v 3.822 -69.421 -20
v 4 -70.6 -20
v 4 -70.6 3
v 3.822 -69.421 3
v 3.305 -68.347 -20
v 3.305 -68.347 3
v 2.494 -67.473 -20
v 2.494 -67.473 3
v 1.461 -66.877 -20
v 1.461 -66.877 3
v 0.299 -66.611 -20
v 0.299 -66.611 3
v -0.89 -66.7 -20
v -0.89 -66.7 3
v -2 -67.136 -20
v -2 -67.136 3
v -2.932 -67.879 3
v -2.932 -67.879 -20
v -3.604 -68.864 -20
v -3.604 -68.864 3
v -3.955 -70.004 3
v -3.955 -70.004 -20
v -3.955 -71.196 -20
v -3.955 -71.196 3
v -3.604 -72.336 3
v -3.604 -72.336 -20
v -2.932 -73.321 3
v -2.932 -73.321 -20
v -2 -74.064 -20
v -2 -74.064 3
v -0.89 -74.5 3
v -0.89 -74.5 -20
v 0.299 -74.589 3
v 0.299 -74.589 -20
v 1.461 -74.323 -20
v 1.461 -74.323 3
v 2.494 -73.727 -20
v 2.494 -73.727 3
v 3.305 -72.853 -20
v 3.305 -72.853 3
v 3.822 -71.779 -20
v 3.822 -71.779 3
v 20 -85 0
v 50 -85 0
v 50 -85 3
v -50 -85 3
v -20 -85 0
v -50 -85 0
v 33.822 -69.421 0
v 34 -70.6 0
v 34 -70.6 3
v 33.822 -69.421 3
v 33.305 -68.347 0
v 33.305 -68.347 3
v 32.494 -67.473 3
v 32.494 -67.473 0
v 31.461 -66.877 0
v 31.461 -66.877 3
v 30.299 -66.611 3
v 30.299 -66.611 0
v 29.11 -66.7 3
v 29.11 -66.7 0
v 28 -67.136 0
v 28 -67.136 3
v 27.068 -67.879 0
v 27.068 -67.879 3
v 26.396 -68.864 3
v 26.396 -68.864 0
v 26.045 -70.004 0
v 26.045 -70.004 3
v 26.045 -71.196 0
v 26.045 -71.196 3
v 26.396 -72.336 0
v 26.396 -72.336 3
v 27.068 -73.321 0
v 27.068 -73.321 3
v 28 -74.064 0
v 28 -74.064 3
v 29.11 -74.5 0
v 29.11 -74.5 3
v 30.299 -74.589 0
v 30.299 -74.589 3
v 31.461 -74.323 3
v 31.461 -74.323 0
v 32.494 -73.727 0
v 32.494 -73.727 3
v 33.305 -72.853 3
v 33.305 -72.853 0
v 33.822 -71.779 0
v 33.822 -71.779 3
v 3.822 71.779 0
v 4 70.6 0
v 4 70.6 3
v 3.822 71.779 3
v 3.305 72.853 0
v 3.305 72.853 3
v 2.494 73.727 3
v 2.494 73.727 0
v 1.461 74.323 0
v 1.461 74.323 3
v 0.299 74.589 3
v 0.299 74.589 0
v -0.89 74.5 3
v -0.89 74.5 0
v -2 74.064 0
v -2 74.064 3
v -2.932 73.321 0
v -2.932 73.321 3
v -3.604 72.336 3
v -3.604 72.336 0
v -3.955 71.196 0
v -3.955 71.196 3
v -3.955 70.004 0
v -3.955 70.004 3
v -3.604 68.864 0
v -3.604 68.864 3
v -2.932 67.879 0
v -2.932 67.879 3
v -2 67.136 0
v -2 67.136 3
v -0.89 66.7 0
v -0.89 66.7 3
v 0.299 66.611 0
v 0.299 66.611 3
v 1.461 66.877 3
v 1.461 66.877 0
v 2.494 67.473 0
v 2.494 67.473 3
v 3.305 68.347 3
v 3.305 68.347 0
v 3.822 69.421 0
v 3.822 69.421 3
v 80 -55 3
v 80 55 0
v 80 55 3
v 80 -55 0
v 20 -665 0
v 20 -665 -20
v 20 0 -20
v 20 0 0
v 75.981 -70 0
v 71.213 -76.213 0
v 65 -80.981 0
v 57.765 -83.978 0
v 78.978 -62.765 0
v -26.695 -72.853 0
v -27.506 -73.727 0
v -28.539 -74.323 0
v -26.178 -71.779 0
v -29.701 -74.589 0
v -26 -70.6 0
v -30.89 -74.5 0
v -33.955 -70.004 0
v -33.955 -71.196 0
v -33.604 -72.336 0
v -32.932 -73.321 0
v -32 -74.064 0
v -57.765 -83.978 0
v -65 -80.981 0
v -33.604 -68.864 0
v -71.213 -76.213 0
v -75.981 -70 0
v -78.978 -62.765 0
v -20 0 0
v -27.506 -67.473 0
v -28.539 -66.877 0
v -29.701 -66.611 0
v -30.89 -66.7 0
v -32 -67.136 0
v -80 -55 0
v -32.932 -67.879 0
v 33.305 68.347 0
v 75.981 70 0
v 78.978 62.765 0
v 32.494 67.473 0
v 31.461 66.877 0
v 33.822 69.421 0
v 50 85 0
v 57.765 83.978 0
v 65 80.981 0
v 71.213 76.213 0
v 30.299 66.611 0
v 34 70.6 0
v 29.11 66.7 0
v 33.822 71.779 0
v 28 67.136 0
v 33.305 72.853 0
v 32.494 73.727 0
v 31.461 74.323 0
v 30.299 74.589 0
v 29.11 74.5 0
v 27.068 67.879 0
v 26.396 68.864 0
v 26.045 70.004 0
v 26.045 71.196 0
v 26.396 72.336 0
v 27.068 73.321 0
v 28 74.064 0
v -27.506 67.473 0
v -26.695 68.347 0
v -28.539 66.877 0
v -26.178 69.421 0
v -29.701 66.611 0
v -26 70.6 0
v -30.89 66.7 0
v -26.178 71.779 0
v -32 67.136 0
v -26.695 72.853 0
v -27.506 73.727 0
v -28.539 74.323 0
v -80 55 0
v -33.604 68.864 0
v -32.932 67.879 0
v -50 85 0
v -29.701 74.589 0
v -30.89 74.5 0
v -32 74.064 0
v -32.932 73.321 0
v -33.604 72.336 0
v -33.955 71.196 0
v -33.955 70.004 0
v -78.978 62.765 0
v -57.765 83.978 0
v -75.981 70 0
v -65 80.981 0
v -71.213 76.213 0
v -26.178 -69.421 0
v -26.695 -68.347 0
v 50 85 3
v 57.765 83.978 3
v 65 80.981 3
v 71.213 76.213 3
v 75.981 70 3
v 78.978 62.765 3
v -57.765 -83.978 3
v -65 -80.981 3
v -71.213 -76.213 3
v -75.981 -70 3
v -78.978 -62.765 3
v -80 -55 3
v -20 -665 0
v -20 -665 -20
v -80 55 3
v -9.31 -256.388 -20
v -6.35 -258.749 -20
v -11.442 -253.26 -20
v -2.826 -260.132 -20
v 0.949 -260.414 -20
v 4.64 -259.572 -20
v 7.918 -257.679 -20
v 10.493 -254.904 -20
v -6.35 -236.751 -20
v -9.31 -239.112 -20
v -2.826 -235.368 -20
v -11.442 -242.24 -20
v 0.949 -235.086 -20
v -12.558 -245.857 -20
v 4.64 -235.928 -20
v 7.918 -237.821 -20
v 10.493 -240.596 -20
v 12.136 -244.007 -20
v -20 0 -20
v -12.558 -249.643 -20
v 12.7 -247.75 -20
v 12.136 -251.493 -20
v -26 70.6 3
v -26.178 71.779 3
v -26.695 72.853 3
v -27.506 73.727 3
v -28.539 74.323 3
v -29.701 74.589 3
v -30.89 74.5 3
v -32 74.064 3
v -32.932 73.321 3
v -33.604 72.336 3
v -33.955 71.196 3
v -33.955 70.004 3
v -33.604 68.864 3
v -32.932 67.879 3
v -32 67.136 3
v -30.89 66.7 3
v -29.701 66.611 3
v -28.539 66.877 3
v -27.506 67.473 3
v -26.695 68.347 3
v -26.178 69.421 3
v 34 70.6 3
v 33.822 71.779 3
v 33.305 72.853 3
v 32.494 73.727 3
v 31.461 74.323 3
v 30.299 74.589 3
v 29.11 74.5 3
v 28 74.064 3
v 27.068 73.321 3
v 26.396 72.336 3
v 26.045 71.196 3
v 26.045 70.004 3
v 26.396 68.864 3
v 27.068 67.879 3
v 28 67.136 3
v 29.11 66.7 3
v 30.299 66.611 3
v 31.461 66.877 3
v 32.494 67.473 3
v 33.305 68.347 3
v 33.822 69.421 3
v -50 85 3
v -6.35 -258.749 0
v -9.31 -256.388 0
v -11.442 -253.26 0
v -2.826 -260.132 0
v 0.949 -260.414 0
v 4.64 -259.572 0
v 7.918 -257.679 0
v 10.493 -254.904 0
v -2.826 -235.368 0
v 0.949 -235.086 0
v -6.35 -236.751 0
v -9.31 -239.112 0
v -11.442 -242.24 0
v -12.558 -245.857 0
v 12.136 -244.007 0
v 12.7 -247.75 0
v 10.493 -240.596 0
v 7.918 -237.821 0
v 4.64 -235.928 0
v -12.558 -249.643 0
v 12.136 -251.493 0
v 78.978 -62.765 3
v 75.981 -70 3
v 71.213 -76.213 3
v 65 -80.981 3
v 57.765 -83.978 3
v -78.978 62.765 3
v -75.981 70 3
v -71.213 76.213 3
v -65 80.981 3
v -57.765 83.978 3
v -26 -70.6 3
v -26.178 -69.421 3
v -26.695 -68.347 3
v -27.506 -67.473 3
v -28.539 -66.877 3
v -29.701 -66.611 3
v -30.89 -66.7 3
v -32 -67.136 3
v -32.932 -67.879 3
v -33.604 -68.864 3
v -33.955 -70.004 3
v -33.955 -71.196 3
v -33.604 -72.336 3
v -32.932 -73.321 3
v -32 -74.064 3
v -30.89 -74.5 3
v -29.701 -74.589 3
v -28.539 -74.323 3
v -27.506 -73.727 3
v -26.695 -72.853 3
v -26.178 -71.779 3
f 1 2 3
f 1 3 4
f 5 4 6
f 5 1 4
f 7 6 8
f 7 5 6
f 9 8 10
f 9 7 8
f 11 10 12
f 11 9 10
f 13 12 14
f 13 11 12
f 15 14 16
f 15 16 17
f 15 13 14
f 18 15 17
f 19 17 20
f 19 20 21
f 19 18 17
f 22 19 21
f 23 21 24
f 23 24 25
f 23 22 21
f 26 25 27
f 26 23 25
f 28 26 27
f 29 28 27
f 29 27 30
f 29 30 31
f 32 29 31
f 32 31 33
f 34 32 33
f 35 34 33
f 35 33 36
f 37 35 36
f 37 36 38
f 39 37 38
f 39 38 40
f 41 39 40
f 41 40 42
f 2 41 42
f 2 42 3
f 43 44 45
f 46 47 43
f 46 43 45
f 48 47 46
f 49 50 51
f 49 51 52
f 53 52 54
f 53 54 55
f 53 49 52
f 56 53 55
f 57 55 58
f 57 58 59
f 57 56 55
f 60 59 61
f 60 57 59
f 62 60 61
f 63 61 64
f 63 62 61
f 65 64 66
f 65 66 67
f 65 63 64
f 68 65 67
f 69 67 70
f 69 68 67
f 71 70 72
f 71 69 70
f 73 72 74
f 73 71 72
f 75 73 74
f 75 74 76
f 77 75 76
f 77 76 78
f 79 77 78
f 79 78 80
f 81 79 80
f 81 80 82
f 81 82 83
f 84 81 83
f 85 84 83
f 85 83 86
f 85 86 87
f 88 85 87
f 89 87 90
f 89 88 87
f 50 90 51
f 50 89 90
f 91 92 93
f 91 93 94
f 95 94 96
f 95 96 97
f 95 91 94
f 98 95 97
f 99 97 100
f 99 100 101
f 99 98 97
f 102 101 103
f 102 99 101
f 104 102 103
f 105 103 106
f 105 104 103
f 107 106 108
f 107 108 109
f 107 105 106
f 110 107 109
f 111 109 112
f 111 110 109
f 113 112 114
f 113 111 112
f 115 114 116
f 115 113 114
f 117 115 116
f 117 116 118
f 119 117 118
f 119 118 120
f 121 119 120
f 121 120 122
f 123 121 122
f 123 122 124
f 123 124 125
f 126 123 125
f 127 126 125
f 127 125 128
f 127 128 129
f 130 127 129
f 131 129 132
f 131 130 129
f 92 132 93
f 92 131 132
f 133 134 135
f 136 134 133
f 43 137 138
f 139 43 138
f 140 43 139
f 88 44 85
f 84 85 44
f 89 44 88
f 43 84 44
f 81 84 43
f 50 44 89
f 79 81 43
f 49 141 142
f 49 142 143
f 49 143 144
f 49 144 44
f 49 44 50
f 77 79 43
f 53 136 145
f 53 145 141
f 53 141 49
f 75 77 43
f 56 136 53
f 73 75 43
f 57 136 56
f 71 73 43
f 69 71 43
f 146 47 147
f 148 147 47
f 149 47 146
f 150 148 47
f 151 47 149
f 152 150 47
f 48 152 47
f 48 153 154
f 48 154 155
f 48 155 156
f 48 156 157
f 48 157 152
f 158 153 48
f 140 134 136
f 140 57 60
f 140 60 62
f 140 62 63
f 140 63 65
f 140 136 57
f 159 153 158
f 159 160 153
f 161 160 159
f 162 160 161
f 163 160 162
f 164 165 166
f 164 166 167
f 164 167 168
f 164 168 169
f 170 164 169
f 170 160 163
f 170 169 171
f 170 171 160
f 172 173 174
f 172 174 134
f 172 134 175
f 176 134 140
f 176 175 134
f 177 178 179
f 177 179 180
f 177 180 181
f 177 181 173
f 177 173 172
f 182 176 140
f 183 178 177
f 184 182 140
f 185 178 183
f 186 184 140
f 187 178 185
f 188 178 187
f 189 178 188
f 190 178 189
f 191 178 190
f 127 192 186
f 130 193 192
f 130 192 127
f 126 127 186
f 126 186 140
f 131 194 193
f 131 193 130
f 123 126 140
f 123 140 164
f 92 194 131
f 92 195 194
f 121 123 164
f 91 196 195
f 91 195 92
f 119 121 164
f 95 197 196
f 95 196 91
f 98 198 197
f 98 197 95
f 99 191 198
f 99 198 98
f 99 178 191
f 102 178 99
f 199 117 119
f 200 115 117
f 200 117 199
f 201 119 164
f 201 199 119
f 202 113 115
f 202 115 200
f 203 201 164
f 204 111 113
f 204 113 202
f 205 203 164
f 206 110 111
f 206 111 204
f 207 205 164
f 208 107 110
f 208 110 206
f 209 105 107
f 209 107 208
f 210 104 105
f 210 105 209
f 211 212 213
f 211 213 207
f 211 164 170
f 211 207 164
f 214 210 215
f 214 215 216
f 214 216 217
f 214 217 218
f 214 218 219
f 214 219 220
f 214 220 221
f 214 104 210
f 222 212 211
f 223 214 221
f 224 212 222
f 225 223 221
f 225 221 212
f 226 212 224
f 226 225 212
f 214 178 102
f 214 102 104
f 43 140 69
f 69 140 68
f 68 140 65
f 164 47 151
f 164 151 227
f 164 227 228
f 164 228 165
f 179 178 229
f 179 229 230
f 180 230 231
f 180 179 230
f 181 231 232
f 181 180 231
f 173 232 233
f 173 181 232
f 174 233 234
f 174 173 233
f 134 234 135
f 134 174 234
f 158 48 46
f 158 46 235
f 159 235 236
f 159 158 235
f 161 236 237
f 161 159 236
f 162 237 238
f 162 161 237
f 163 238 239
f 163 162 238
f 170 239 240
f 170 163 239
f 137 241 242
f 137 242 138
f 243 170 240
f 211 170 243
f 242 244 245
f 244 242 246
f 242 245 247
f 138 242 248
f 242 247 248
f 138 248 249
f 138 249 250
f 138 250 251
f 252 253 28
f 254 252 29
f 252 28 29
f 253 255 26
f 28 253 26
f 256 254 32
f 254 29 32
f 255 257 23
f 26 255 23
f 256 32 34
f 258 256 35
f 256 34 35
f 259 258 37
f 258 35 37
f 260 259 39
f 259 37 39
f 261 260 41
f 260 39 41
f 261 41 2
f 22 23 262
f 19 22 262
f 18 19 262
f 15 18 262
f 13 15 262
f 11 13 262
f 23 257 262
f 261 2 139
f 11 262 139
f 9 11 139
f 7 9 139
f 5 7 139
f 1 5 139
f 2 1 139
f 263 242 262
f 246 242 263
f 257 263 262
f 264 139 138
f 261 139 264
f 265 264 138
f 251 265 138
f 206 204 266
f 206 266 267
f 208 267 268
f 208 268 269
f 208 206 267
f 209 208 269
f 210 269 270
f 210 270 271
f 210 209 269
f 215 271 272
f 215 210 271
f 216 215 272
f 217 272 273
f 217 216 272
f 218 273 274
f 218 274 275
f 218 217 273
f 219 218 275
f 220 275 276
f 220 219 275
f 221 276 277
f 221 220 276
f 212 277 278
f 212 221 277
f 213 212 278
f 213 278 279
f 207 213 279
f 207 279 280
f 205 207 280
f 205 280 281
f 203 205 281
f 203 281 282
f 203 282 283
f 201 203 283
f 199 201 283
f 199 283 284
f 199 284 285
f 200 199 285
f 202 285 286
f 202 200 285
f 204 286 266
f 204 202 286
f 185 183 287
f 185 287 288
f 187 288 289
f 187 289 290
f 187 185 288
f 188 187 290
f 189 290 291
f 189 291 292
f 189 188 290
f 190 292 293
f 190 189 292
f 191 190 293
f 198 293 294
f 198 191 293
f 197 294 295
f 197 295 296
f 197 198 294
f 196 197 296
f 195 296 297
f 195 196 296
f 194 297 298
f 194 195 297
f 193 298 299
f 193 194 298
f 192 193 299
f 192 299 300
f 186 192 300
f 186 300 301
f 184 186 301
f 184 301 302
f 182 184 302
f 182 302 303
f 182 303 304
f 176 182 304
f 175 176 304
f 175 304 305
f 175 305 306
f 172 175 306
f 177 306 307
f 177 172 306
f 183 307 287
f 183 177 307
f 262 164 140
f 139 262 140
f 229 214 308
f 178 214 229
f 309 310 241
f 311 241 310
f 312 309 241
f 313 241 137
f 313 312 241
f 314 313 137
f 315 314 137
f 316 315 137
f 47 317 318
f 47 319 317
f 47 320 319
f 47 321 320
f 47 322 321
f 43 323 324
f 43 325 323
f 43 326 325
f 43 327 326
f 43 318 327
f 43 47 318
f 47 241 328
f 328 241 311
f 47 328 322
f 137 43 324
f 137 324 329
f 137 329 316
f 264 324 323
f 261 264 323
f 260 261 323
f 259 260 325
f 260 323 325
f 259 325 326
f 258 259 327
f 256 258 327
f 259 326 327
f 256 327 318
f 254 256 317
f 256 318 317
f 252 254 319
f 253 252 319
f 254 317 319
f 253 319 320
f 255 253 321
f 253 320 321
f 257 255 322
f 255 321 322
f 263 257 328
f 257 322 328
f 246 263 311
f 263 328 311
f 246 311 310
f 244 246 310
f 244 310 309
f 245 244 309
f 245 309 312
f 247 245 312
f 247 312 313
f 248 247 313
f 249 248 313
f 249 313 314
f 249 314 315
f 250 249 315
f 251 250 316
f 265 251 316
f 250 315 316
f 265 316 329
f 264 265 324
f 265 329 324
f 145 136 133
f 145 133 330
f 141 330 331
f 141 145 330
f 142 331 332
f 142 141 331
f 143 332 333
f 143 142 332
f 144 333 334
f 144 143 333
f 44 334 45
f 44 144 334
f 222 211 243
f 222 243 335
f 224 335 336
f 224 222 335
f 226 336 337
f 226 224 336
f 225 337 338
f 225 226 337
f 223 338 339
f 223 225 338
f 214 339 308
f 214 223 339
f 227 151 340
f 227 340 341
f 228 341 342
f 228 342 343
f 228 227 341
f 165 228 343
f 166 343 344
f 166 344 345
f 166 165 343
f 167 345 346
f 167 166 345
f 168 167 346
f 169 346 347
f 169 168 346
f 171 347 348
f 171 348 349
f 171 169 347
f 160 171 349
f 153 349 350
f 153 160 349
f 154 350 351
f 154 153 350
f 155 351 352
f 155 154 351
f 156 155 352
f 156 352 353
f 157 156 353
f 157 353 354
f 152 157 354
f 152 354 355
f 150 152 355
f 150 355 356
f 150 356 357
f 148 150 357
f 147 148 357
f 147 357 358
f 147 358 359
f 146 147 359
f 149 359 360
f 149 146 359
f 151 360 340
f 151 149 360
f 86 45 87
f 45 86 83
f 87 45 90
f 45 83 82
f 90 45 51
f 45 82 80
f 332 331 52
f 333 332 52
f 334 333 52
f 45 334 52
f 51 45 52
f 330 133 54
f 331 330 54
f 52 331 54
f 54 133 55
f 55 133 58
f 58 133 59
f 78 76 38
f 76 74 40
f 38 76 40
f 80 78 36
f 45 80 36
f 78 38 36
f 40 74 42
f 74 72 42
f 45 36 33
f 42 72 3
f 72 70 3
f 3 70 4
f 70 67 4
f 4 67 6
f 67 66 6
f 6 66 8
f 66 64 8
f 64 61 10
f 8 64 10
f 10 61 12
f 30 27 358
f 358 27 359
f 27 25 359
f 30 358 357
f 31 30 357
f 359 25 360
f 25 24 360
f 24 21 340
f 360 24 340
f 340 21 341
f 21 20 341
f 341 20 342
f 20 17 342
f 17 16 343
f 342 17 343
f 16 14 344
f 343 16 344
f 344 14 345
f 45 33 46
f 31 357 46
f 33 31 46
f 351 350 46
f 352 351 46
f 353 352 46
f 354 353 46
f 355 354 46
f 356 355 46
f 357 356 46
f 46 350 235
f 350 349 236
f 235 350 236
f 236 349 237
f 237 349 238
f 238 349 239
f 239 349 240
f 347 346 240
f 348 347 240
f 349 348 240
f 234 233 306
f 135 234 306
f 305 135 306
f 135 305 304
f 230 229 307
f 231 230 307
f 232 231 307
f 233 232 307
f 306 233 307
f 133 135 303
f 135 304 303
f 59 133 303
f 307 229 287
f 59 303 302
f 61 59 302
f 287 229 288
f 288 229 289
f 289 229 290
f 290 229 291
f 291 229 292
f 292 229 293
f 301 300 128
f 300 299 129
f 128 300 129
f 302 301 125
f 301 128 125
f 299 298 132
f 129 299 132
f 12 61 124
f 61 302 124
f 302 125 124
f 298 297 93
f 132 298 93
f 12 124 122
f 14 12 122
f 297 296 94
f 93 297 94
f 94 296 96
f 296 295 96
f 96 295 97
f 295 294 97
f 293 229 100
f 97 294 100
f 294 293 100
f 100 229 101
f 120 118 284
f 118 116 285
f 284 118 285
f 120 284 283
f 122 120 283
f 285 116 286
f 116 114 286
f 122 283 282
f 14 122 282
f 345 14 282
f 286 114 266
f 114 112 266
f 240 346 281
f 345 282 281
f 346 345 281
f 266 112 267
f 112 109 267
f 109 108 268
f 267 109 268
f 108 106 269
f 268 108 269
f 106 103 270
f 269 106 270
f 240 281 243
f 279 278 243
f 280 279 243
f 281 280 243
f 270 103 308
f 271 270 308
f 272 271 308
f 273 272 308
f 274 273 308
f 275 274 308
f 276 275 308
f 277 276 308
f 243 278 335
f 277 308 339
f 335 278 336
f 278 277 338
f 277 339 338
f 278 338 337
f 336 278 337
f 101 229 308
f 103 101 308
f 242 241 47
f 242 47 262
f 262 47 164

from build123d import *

# Parameters (mm, degrees)
CROQUIS1_R                 = 4
SALIENTE_EXTRUIR1_DEPTH    = 3
CROQUIS2_W                 = 40
CROQUIS2_H                 = 665
CROQUIS2_R                 = 12.7
SALIENTE_EXTRUIR2_DEPTH    = 20
CORTAR_EXTRUIR1_DEPTH      = 99
CORTAR_EXTRUIR1_DEPTH_BACK = 71
CROQUIS3_R                 = 4


with BuildPart() as part:
    # Croquis1 → Saliente-Extruir1 (new body)
    with BuildSketch(Plane.XY):
        with BuildLine():
            Line((-50, 85), (50, 85))
            ThreePointArc((50, 85), (71.213203436, 76.213203436), (80, 55))
            Line((80, 55), (80, -55))
            ThreePointArc((80, -55), (71.213203436, -76.213203436), (50, -85))
            Line((50, -85), (-50, -85))
            ThreePointArc((-50, -85), (-71.213203436, -76.213203436), (-80, -55))
            Line((-80, -55), (-80, 55))
            ThreePointArc((-80, 55), (-71.213203436, 76.213203436), (-50, 85))
        make_face()
        with Locations((0, 70.6)):
            Circle(CROQUIS1_R, mode=Mode.SUBTRACT)
        with Locations((0, -70.6)):
            Circle(CROQUIS1_R, mode=Mode.SUBTRACT)
        with Locations((-30, 70.6)):
            Circle(CROQUIS1_R, mode=Mode.SUBTRACT)
        with Locations((30, 70.6)):
            Circle(CROQUIS1_R, mode=Mode.SUBTRACT)
        with Locations((-30, -70.6)):
            Circle(CROQUIS1_R, mode=Mode.SUBTRACT)
        with Locations((30, -70.6)):
            Circle(CROQUIS1_R, mode=Mode.SUBTRACT)
    extrude(amount=SALIENTE_EXTRUIR1_DEPTH)

    # Croquis2 → Saliente-Extruir2 (add)
    with BuildSketch(Plane.XY):
        with Locations((0, -332.5)):
            Rectangle(CROQUIS2_W, CROQUIS2_H)
        with Locations((0, -247.75)):
            Circle(CROQUIS2_R, mode=Mode.SUBTRACT)
    extrude(amount=-SALIENTE_EXTRUIR2_DEPTH)

    # Croquis3 → Cortar-Extruir1 (cut, two sides: drawn at the far end of the back side and taken through both)
    with BuildSketch(Plane.XY.offset(-CORTAR_EXTRUIR1_DEPTH_BACK)):
        with Locations((0, -70.6)):
            Circle(CROQUIS3_R)
    extrude(amount=CORTAR_EXTRUIR1_DEPTH + CORTAR_EXTRUIR1_DEPTH_BACK, mode=Mode.SUBTRACT)


solid = part.part
